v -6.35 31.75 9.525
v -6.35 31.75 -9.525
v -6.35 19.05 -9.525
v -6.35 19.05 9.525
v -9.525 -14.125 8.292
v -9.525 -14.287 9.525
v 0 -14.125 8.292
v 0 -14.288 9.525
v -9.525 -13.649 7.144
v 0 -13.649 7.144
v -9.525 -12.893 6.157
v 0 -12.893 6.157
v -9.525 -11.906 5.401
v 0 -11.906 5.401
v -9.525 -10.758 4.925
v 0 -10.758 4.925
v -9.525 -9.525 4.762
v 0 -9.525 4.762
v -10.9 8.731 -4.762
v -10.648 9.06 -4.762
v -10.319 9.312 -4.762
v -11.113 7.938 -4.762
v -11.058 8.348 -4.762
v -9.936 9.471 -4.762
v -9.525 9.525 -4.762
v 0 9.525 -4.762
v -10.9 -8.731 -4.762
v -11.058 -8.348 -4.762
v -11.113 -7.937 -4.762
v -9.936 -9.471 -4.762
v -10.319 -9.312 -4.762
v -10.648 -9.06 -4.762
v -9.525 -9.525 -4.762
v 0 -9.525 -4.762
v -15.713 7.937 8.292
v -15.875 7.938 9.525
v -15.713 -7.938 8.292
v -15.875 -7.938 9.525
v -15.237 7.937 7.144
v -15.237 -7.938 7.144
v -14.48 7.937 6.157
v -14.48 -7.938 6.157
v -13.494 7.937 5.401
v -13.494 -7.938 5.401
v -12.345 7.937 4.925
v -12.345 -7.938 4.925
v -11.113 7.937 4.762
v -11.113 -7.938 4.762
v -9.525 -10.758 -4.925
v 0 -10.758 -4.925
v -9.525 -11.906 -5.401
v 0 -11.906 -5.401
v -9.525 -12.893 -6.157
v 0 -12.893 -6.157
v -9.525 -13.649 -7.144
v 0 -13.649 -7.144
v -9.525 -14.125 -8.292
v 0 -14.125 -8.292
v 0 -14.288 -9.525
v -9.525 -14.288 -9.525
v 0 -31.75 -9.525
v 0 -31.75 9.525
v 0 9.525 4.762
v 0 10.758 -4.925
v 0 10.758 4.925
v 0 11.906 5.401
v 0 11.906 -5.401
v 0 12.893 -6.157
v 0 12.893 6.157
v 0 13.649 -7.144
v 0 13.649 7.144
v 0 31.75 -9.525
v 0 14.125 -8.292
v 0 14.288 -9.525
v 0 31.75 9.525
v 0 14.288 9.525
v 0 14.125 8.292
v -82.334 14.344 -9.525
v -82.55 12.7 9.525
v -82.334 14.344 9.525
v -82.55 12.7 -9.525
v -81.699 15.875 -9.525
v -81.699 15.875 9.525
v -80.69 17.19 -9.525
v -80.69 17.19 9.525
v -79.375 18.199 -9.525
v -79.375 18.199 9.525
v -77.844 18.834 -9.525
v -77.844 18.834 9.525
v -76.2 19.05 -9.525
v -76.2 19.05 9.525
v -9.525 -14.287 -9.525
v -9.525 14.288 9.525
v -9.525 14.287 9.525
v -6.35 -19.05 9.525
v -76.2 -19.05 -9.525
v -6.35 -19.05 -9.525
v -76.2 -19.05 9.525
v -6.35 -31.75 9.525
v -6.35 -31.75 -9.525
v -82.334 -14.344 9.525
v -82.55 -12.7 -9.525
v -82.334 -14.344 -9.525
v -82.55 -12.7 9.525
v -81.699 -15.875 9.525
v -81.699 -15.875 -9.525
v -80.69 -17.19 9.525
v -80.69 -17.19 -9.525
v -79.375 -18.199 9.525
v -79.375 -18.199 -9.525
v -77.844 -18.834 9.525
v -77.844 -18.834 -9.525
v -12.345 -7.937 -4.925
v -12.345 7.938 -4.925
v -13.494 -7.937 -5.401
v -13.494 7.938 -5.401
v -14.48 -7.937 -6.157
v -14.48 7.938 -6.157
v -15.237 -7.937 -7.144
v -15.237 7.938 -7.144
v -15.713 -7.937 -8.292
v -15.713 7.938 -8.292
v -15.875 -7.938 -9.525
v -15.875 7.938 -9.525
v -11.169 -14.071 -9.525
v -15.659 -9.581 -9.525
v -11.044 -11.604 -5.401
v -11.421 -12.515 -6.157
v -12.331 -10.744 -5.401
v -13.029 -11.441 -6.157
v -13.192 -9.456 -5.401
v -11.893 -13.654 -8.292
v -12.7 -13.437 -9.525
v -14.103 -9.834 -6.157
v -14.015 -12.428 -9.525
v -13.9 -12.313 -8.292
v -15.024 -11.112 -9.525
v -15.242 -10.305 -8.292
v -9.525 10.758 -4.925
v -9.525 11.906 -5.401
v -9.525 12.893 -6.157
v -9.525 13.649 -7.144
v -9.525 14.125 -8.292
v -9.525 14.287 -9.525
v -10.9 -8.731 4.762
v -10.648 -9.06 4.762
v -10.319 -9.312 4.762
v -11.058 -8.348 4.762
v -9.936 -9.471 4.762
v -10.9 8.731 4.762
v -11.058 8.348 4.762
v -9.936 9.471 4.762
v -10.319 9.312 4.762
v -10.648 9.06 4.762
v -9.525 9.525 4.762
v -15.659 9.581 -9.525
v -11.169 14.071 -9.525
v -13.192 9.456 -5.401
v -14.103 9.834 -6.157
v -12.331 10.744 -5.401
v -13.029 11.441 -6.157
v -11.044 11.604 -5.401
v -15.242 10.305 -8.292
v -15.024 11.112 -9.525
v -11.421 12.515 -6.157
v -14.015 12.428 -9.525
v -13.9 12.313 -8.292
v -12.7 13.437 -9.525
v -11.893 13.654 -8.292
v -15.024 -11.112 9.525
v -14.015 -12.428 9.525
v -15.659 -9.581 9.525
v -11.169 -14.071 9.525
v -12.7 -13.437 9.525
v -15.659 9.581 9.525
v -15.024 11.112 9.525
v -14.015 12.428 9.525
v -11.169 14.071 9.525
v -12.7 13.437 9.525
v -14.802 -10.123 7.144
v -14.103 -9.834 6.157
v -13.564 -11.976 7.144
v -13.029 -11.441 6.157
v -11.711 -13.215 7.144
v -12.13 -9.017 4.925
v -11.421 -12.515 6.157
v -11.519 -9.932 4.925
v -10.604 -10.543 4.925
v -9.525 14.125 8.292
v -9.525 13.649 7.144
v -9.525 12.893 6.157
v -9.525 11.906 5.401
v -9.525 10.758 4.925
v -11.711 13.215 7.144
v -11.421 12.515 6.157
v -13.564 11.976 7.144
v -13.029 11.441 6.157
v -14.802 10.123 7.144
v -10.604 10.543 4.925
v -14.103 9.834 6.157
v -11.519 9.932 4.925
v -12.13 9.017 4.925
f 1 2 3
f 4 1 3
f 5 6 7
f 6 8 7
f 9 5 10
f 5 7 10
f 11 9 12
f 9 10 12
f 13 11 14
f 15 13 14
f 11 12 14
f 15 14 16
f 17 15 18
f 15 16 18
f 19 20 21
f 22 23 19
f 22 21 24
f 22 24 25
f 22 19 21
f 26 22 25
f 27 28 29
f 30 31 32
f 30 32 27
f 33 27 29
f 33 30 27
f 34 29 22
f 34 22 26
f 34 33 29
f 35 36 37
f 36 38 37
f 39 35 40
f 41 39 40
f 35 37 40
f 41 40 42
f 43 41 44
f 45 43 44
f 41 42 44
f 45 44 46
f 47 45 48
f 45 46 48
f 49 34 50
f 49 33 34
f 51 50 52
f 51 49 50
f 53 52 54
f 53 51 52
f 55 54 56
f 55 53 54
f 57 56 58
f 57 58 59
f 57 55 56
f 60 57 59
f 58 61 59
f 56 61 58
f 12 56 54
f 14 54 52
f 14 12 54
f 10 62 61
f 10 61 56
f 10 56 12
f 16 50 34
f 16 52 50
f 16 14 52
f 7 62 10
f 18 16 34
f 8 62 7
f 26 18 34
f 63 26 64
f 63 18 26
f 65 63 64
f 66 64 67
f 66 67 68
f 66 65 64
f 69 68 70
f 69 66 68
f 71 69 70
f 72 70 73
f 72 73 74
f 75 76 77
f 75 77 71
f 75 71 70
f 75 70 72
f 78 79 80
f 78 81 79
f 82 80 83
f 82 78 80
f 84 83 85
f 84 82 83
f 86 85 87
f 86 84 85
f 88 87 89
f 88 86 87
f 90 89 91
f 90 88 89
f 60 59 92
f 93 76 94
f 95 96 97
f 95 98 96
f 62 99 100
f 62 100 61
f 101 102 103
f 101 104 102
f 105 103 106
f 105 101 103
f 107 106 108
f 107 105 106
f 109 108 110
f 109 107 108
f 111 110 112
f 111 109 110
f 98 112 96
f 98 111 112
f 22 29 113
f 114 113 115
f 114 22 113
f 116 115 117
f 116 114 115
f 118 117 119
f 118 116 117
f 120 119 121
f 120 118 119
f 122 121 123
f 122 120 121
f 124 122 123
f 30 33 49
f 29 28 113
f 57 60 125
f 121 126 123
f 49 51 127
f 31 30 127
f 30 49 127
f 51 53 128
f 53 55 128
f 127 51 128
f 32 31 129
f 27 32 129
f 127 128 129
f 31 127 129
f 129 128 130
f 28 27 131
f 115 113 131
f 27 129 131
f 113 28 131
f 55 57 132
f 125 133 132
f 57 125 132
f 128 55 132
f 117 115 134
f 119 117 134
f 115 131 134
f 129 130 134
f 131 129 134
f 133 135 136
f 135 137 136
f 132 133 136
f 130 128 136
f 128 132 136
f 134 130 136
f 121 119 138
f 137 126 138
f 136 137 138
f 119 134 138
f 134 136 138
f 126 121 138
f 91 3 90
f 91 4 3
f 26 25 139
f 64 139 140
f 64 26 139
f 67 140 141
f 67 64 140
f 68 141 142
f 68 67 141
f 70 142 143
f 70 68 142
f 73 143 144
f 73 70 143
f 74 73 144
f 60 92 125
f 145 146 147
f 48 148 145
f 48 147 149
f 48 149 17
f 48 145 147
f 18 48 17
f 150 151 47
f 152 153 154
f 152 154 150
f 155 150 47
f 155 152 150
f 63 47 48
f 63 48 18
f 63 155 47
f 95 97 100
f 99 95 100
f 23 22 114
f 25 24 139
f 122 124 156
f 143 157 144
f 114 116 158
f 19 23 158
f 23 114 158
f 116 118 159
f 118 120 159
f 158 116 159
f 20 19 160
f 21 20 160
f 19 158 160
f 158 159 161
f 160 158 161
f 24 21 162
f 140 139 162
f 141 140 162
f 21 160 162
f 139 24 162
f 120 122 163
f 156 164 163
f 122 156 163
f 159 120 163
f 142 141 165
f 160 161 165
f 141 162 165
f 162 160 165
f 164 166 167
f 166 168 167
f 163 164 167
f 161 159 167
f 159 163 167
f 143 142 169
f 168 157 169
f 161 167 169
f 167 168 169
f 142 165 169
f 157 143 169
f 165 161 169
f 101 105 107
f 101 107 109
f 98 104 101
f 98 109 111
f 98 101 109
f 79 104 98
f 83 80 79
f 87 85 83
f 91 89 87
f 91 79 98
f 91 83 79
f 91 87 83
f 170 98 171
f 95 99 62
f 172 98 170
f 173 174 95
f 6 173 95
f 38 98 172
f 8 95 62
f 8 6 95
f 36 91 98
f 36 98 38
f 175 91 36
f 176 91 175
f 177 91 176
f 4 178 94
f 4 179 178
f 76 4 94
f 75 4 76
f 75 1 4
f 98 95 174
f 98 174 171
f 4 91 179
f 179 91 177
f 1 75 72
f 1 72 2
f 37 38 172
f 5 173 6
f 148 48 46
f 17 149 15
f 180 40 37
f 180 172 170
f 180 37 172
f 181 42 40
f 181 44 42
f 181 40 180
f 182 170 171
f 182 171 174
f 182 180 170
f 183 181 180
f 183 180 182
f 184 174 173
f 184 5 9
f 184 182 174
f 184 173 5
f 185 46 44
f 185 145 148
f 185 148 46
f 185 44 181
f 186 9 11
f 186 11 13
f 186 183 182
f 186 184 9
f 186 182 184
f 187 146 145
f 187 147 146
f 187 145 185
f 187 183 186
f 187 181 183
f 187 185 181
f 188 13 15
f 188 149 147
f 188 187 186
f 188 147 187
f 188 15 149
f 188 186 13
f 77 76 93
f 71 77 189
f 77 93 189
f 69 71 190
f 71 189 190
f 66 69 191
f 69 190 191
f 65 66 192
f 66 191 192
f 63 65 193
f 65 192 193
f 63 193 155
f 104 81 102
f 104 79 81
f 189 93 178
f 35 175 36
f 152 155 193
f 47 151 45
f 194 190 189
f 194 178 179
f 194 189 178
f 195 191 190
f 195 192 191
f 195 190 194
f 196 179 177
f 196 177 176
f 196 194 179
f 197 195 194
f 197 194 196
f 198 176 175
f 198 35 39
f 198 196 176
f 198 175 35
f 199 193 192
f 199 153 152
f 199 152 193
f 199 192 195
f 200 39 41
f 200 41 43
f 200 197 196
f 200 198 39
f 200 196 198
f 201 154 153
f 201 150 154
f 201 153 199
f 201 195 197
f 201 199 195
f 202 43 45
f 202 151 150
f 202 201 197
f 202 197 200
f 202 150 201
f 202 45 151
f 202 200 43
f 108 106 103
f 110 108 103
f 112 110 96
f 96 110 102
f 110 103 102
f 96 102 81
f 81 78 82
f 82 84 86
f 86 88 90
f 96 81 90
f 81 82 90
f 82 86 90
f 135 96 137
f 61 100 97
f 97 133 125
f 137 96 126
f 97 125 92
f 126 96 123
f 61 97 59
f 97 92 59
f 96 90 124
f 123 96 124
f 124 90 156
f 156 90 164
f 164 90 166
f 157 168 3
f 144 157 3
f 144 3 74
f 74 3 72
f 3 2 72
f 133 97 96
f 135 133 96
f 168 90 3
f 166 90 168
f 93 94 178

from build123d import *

# Parameters (mm, degrees)
F1_DEPTH = 9.525
F2_R     = 6.35
F4_DEPTH = 4.7625
F5_R     = 4.76249
F7_DEPTH = 4.7625
F8_R     = 4.76249


# Not quite as in the source:
# - a fillet or chamfer is up to 0.001 mm smaller than in the source, because OpenCascade refuses the exact size


with BuildPart() as f1:
    # F0 (on Top) → F1 (new body, symmetric)
    with BuildSketch(Plane.XY):
        Polygon((-82.55, 19.05), (-82.55, -19.05), (-6.35, -19.05), (-6.35, -31.75), (0, -31.75), (0, 31.75), (-6.35, 31.75), (-6.35, 19.05), align=None)
    extrude(amount=F1_DEPTH, both=True)

    # F2
    f2_edges = [f1.edges().sort_by_distance(p)[0] for p in [
        (-82.55, -19.05, 0),
        (-82.55, 19.05, 0),
    ]]
    fillet(f2_edges, radius=F2_R)

    # F3 (on face) → F4 (cut)
    with BuildSketch(Plane.XY.offset(9.525)):
        with BuildLine():
            Line((0, -14.2875), (0, 14.2875))
            Line((0, 14.2875), (-9.525, 14.2875))
            ThreePointArc((-9.525, 14.2875), (-14.0151280605, 12.4276280605), (-15.875, 7.9375))
            Line((-15.875, 7.9375), (-15.875, -7.9375))
            ThreePointArc((-15.875, -7.9375), (-14.0151280605, -12.4276280605), (-9.525, -14.2875))
            Line((-9.525, -14.2875), (0, -14.2875))
        make_face()
    extrude(amount=-F4_DEPTH, mode=Mode.SUBTRACT)

    # F5 (radius 4.7625 in the source; OpenCascade refuses exactly that, so slightly less here)
    f5_edges = [f1.edges().sort_by_distance(p)[0] for p in [
        (-4.7625, 14.2875, 4.7625),
        (-14.015128, 12.427628, 4.7625),
    ]]
    fillet(f5_edges, radius=F5_R)

    # F6 (on face) → F7 (cut)
    with BuildSketch(Plane(origin=(0, 0, -9.525), x_dir=(1, 0, 0), z_dir=(0, 0, -1))):
        with BuildLine():
            Line((0, -14.2875), (0, 14.2875))
            Line((0, 14.2875), (-9.525, 14.2875))
            ThreePointArc((-9.525, 14.2875), (-14.0151280605, 12.4276280605), (-15.875, 7.9375))
            Line((-15.875, 7.9375), (-15.875, -7.9375))
            ThreePointArc((-15.875, -7.9375), (-14.0151280605, -12.4276280605), (-9.525, -14.2875))
            Line((-9.525, -14.2875), (0, -14.2875))
        make_face()
    extrude(amount=-F7_DEPTH, mode=Mode.SUBTRACT)

    # F8 (radius 4.7625 in the source; OpenCascade refuses exactly that, so slightly less here)
    f8_edges = [f1.edges().sort_by_distance(p)[0] for p in [
        (-4.7625, -14.2875, -4.7625),
        (-14.015128, -12.427628, -4.7625),
    ]]
    fillet(f8_edges, radius=F8_R)


solid = f1.part
